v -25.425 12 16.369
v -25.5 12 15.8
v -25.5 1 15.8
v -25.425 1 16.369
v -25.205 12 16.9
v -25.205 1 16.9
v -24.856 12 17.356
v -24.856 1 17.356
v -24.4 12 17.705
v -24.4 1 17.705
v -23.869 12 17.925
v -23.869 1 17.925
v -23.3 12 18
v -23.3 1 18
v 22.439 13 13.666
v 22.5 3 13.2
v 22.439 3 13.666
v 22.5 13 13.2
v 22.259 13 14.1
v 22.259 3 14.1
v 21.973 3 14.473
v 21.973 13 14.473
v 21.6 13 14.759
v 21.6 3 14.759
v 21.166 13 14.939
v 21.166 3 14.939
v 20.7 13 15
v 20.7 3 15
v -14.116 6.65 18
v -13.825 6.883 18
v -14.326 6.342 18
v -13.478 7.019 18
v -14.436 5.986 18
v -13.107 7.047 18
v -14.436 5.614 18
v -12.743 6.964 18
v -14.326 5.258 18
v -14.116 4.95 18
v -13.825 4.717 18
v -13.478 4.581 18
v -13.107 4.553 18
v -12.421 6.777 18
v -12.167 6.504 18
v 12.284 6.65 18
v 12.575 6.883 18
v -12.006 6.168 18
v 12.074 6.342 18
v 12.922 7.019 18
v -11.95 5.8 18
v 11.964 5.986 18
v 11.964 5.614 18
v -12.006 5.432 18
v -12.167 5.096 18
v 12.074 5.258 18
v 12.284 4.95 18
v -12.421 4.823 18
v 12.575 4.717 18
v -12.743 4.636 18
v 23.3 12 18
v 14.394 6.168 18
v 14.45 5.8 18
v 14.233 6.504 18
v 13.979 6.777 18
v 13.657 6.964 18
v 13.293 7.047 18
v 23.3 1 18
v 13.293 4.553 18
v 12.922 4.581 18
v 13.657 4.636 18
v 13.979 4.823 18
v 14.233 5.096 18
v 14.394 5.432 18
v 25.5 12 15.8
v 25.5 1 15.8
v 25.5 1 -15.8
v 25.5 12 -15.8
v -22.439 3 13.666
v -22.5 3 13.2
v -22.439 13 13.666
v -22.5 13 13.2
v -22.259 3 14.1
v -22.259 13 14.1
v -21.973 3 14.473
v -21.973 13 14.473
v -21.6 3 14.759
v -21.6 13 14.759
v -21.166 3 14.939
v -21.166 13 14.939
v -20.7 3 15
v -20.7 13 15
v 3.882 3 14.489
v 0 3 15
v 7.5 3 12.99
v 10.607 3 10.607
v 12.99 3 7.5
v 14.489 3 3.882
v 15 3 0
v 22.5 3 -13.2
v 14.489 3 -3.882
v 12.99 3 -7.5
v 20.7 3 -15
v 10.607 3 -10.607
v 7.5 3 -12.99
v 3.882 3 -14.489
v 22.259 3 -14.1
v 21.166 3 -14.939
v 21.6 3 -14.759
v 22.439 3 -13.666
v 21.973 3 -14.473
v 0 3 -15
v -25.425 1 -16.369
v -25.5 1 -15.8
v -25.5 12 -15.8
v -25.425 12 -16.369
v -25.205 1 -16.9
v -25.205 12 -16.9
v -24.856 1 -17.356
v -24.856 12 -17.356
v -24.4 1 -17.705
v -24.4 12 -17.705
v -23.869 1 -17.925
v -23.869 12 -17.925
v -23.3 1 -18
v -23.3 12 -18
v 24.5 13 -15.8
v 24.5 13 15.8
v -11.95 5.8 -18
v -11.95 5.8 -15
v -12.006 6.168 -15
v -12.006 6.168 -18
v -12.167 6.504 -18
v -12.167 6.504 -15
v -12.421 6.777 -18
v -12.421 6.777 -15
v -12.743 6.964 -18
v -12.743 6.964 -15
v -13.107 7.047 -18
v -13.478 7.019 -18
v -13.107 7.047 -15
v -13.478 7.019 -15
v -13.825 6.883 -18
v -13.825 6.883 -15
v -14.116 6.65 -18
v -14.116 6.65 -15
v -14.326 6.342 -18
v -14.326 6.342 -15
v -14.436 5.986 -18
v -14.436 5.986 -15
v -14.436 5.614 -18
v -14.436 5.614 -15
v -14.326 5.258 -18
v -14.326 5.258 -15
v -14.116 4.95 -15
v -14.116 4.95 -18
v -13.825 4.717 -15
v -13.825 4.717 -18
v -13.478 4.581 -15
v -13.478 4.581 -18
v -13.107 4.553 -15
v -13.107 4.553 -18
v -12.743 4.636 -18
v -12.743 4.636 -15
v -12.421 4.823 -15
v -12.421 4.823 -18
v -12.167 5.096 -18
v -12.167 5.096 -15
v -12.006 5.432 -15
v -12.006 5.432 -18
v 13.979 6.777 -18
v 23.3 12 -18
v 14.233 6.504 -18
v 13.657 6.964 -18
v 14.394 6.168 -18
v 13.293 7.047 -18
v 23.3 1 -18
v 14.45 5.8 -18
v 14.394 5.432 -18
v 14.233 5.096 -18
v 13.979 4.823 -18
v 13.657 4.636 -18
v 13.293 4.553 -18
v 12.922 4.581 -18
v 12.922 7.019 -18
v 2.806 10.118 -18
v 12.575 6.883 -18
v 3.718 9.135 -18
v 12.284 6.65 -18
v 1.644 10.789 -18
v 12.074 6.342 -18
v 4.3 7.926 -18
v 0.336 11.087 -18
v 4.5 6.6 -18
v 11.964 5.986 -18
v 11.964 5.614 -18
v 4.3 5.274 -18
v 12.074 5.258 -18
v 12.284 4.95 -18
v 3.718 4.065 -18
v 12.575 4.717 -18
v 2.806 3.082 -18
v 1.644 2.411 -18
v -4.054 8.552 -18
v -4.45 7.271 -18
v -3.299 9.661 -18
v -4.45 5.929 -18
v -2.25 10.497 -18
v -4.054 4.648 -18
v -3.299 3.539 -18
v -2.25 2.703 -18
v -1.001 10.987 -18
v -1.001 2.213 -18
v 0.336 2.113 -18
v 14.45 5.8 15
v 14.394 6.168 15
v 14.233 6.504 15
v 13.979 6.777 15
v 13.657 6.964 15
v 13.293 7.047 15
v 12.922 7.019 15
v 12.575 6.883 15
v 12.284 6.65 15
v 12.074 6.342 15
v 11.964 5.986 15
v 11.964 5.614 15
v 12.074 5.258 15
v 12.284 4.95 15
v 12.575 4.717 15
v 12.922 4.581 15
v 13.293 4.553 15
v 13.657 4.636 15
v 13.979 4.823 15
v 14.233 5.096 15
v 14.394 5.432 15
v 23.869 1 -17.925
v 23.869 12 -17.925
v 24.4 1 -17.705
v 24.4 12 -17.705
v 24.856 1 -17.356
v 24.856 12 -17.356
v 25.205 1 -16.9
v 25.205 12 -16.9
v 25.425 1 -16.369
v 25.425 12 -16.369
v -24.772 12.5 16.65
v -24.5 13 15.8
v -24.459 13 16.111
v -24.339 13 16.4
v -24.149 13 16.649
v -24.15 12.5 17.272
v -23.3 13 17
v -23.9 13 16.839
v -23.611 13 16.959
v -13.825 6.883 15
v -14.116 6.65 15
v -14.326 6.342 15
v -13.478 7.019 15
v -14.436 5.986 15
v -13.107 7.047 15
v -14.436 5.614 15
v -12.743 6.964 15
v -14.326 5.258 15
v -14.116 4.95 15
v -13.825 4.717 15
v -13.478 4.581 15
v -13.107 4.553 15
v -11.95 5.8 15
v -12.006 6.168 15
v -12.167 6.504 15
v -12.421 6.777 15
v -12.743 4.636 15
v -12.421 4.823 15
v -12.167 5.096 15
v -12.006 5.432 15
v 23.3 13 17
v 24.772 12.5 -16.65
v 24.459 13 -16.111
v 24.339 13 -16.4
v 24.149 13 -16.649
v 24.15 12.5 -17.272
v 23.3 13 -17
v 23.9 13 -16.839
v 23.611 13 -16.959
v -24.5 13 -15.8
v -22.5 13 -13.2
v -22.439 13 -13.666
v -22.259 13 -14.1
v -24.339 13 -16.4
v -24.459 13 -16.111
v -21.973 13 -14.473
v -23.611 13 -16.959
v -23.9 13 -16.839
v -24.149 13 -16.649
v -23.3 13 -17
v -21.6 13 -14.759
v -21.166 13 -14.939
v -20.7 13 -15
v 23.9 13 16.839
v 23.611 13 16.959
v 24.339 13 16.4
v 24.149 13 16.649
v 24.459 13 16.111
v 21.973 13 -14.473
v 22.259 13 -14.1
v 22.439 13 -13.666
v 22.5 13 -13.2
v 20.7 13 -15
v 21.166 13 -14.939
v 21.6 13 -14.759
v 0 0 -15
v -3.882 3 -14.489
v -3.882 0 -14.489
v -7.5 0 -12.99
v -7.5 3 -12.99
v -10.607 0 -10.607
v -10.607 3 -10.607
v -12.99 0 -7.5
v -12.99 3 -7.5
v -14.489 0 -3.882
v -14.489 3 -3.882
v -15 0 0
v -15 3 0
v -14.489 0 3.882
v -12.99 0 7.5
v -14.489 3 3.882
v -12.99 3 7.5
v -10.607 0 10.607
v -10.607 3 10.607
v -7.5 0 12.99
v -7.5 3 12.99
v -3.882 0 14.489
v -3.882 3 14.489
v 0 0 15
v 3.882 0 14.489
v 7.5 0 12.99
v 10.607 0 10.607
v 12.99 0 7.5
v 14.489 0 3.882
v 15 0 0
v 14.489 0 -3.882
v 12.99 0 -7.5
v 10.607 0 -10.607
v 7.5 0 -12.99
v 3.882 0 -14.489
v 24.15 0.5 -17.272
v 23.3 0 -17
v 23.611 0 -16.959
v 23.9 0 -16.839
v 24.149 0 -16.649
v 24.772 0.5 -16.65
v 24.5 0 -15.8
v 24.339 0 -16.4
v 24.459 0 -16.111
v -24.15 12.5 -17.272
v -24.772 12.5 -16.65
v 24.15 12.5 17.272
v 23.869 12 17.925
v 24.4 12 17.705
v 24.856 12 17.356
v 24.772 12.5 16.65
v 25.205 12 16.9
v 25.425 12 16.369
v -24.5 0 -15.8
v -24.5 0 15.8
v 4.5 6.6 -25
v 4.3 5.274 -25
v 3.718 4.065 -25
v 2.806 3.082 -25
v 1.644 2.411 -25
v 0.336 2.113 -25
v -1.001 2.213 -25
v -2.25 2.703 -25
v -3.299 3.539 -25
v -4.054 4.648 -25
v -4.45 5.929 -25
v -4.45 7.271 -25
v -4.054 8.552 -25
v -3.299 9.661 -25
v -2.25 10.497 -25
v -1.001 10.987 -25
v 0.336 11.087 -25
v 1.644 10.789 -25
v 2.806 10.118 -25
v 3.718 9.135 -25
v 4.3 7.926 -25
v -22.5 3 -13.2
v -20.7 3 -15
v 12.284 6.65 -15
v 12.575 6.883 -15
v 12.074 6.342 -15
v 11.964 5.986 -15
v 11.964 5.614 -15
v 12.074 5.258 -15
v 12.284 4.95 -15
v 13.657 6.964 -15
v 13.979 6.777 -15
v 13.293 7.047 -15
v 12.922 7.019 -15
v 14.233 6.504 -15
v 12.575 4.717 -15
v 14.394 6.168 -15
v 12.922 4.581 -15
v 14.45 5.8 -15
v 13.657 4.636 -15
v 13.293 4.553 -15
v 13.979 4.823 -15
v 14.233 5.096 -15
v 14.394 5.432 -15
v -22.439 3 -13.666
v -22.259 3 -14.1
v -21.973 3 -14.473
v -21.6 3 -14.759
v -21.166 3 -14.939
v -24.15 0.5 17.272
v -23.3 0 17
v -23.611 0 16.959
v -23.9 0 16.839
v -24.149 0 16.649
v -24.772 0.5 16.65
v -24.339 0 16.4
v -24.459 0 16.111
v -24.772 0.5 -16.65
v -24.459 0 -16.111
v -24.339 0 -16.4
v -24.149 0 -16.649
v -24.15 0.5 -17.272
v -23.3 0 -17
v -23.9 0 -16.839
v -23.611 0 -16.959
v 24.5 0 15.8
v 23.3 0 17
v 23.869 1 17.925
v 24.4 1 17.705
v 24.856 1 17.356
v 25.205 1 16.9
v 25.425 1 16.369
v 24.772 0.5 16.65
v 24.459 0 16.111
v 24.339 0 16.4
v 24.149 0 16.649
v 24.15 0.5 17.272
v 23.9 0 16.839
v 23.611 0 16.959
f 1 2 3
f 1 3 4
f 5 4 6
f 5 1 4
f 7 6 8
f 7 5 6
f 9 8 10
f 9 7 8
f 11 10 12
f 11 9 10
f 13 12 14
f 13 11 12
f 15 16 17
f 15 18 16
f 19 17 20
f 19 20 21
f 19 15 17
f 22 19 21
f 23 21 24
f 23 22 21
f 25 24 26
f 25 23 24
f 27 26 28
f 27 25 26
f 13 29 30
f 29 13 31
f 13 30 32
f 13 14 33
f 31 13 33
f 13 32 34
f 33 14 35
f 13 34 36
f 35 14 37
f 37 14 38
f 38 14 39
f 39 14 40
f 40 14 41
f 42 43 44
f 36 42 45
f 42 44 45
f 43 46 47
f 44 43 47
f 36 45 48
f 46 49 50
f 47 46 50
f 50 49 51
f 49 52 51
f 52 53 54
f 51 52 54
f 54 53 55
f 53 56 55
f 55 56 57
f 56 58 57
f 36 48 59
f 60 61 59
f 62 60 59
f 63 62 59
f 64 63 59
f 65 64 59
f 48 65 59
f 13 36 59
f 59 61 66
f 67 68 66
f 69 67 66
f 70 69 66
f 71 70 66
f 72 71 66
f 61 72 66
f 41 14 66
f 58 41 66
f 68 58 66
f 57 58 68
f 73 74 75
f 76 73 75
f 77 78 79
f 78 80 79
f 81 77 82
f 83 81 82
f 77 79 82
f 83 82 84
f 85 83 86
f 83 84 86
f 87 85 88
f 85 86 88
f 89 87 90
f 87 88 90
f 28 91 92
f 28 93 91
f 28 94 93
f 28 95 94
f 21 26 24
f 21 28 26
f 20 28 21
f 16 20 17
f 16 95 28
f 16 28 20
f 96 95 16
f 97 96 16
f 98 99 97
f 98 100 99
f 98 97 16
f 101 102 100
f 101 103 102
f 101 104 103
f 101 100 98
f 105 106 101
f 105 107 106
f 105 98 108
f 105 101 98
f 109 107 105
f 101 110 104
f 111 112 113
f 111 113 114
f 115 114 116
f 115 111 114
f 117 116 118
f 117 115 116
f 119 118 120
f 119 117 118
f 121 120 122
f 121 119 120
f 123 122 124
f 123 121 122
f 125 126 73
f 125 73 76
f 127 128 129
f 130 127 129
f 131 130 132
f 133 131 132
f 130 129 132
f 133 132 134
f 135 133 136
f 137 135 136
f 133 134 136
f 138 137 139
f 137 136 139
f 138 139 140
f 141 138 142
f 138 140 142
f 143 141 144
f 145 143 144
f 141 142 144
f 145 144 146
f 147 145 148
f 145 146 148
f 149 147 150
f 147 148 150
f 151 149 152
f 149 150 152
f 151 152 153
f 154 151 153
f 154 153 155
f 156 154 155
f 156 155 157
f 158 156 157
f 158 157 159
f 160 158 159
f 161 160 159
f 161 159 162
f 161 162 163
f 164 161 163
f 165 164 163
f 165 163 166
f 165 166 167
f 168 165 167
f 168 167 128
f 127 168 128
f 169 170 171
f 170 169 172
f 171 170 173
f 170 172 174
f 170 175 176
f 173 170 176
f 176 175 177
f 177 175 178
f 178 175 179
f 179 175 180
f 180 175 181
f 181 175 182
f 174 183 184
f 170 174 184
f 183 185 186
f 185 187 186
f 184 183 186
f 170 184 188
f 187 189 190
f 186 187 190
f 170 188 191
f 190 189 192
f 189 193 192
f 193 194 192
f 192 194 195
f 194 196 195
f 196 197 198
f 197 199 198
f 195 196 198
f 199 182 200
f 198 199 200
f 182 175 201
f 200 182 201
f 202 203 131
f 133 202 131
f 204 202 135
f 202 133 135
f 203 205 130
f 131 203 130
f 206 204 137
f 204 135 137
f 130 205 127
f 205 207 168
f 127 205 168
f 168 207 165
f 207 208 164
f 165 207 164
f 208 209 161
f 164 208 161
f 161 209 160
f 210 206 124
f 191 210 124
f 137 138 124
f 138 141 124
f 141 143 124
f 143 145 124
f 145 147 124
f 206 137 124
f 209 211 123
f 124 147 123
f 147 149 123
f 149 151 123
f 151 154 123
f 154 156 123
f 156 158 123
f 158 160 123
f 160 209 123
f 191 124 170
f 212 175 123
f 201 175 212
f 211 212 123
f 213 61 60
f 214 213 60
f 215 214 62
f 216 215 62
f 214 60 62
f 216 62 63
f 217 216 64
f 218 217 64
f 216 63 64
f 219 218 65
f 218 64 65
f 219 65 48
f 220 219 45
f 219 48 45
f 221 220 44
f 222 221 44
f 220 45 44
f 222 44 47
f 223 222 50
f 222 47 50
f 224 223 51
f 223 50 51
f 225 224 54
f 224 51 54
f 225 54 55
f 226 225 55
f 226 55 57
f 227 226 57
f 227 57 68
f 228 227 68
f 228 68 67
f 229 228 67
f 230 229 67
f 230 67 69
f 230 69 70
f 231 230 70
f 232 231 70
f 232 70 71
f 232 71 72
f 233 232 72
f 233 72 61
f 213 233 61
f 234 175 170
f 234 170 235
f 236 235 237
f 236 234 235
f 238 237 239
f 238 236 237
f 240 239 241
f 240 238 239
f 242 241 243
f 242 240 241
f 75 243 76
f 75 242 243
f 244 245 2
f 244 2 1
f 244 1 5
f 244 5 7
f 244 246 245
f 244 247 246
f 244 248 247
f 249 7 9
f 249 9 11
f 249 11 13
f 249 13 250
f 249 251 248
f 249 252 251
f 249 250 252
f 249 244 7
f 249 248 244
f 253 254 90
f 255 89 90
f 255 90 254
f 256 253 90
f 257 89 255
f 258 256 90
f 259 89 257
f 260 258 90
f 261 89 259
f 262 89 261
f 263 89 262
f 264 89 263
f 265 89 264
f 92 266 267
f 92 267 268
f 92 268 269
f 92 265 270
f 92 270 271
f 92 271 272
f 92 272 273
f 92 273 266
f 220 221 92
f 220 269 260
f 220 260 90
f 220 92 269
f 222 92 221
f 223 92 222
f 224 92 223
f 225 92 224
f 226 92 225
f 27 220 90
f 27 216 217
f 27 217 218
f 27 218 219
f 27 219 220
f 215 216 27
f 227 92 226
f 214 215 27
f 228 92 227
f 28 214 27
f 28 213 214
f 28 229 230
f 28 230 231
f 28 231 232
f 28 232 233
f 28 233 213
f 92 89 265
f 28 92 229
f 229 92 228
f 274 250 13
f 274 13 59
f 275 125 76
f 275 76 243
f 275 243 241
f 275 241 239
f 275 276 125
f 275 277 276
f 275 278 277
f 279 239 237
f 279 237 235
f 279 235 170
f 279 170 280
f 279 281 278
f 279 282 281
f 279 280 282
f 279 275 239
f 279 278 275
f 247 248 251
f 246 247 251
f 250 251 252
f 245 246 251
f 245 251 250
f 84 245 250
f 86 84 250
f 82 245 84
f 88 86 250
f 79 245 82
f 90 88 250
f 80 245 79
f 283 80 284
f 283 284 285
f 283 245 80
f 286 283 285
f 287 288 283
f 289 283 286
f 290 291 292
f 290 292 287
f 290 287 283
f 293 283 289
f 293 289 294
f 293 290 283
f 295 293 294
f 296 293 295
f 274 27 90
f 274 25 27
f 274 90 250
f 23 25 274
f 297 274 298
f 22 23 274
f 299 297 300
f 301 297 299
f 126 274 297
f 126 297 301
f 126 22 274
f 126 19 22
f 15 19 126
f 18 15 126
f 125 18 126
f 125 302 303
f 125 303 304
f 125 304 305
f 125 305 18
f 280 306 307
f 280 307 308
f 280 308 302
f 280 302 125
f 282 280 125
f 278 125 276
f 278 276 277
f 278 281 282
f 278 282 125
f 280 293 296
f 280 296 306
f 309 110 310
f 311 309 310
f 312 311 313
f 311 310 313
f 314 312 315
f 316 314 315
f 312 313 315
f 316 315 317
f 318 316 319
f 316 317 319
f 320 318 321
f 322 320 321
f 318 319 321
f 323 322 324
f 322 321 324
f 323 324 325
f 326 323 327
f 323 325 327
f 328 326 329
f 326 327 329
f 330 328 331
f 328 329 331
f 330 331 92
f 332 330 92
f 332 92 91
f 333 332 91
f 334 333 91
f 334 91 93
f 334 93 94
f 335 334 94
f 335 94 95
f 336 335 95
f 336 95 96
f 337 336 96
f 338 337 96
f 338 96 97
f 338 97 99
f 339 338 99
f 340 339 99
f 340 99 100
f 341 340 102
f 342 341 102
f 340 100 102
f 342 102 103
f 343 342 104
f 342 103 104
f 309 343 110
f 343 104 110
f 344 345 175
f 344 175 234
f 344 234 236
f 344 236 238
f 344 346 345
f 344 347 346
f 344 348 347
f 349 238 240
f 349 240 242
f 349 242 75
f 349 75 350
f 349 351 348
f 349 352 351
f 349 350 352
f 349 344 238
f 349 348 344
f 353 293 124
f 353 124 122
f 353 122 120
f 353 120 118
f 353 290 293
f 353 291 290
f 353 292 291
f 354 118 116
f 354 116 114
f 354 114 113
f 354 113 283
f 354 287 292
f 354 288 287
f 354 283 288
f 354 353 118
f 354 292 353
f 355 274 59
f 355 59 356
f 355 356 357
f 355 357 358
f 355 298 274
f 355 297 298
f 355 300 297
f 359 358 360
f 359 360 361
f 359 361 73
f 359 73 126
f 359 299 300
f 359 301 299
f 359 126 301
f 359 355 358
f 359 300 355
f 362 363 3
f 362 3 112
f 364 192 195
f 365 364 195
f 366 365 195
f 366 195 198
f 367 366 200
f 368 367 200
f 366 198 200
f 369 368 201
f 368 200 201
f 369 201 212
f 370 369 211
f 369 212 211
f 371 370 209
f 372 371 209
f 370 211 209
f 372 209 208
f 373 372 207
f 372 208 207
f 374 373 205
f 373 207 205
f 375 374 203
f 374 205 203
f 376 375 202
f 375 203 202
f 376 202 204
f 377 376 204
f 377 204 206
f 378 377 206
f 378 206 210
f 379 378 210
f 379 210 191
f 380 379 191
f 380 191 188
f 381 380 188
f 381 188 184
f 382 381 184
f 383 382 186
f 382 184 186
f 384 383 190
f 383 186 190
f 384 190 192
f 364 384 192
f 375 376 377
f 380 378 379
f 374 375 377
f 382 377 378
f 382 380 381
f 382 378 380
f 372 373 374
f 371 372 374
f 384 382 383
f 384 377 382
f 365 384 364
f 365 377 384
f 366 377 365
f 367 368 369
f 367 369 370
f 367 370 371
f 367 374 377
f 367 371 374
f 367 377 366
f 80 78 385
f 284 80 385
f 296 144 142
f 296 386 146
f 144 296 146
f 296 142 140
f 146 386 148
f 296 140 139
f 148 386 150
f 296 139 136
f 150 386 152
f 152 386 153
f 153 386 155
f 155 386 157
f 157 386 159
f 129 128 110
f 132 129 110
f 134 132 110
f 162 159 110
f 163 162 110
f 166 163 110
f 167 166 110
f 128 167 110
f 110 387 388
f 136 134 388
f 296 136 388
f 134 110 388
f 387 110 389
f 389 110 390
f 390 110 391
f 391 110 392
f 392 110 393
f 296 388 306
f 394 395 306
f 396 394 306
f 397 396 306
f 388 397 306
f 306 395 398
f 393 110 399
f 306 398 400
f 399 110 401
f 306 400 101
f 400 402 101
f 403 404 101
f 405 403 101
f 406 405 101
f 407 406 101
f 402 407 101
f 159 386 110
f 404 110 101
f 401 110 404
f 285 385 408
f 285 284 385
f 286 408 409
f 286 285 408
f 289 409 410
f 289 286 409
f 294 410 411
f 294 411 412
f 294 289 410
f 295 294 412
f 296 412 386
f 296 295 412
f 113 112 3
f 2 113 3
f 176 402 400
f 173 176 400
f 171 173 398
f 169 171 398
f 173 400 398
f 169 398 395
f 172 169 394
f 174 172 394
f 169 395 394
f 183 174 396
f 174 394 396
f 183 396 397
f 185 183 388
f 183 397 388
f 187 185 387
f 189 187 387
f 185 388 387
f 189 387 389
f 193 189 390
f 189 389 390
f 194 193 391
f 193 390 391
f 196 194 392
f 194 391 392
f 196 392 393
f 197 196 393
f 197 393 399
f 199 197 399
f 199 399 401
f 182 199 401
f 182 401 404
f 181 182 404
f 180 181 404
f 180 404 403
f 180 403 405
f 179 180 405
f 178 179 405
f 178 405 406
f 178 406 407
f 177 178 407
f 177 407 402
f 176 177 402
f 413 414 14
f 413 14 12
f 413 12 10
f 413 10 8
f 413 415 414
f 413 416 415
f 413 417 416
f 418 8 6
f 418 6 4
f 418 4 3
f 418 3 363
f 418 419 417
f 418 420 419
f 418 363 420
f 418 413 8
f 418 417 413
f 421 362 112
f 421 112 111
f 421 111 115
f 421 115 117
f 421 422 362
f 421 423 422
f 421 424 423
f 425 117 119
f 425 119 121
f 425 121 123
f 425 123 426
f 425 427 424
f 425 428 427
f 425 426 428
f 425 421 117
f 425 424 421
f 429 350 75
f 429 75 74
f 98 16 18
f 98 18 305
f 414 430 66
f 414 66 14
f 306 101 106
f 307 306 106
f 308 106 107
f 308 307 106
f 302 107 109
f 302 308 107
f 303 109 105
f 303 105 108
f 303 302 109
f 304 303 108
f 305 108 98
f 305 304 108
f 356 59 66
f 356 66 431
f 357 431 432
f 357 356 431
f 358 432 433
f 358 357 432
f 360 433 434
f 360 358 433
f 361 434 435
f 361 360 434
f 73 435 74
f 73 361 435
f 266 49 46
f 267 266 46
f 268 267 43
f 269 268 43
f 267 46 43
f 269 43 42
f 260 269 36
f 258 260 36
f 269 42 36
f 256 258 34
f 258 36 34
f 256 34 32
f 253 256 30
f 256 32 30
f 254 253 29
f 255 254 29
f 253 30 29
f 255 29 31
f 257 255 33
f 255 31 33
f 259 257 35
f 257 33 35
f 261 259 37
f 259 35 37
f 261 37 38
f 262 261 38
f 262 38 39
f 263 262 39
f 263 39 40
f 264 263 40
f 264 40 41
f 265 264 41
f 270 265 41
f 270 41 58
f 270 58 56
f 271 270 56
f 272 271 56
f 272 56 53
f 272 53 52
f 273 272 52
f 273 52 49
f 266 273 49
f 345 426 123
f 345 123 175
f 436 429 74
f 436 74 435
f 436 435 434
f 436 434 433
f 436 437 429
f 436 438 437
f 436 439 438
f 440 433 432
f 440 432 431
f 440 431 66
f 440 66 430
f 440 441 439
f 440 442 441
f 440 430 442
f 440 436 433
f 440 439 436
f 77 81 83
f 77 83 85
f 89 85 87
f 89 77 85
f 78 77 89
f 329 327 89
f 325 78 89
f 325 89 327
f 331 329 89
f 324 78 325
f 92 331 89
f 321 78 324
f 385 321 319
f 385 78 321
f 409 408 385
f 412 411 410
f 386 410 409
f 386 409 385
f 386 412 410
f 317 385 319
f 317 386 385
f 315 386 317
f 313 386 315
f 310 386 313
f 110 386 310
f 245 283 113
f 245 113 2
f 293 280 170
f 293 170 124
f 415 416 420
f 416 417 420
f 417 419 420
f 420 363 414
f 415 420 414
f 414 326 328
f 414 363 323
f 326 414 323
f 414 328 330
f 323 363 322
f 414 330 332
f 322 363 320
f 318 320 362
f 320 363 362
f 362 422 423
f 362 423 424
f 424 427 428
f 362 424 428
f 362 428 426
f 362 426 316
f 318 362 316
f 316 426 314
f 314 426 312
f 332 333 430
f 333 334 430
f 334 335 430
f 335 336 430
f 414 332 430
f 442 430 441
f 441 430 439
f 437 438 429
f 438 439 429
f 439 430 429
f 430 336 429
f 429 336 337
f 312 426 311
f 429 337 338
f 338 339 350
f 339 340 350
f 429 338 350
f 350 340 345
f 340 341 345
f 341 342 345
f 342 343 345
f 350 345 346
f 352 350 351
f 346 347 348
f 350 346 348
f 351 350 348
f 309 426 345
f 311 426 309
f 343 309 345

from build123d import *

# Parameters (mm, degrees)
SKETCH1_W           = 51
SKETCH1_H           = 36
BOSS_EXTRUDE1_DEPTH = 3
SKETCH2_W           = 45
SKETCH2_H           = 30
BOSS_EXTRUDE2_DEPTH = 10
FILLET1_R           = 1.8
FILLET2_R           = 2.2
CHAMFER1_SIZE       = 1
SKETCH3_R           = 15
CUT_EXTRUDE1_DEPTH  = 10
SKETCH4_R           = 1.25
CUT_EXTRUDE2_DEPTH  = 50
CHAMFER2_SIZE       = 1
SKETCH5_R           = 4.5
BOSS_EXTRUDE3_DEPTH = 7


with BuildPart() as part:
    # Sketch1 → Boss-Extrude1 (new body)
    with BuildSketch(Plane(origin=(0, 0, 0), x_dir=(1, 0, 0), z_dir=(0, 1, 0))):
        Rectangle(SKETCH1_W, SKETCH1_H)
    extrude(amount=BOSS_EXTRUDE1_DEPTH)

    # Sketch2 → Boss-Extrude2 (add)
    with BuildSketch(Plane(origin=(0, 3, 0), x_dir=(1, 0, 0), z_dir=(0, 1, 0))):
        Polygon((-22.5, 18), (-25.5, 18), (-25.5, 15), (-25.5, -15), (-25.5, -18), (-22.5, -18), (22.5, -18), (25.5, -18), (25.5, -15), (25.5, 15), (25.5, 18), (22.5, 18), align=None)
        Rectangle(SKETCH2_W, SKETCH2_H, mode=Mode.SUBTRACT)
    extrude(amount=BOSS_EXTRUDE2_DEPTH)

    # Fillet1
    fillet1_edges = [part.edges().sort_by_distance(p)[0] for p in [
        (22.5, 8, 15),
        (-22.5, 8, 15),
        (-22.5, 8, -15),
        (22.5, 8, -15),
    ]]
    fillet(fillet1_edges, radius=FILLET1_R)

    # Fillet2
    fillet2_edges = [part.edges().sort_by_distance(p)[0] for p in [
        (25.5, 6.5, 18),
        (-25.5, 6.5, 18),
        (-25.5, 6.5, -18),
        (25.5, 6.5, -18),
    ]]
    fillet(fillet2_edges, radius=FILLET2_R)

    # Chamfer1
    chamfer1_edges = [part.edges().sort_by_distance(p)[0] for p in [
        (-25.5, 0, 0),
        (25.5, 0, 0),
        (0, 0, 18),
        (0, 0, -18),
        (24.855634919, 0, 17.355634919),
        (24.855634919, 0, -17.355634919),
        (-24.855634919, 0, 17.355634919),
        (-24.855634919, 0, -17.355634919),
    ]]
    chamfer(chamfer1_edges, length=CHAMFER1_SIZE)

    # Sketch3 → Cut-Extrude1 (cut)
    with BuildSketch(Plane(origin=(0, 3, 0), x_dir=(1, 0, 0), z_dir=(0, 1, 0))):
        with Locations(Location((0, 0, 0), (0, 0, 90))):
            Circle(SKETCH3_R)
    extrude(amount=-CUT_EXTRUDE1_DEPTH, mode=Mode.SUBTRACT)

    # Sketch4 → Cut-Extrude2 (cut)
    with BuildSketch(Plane.XY.offset(18)):
        with Locations((-13.2, 5.8)):
            Circle(SKETCH4_R)
        with Locations((13.2, 5.8)):
            Circle(SKETCH4_R)
    extrude(amount=-CUT_EXTRUDE2_DEPTH, mode=Mode.SUBTRACT)

    # Chamfer2
    chamfer2_edges = [part.edges().sort_by_distance(p)[0] for p in [
        (-25.5, 13, 0),
        (0, 13, -18),
        (0, 13, 18),
        (25.5, 13, 0),
        (24.855634919, 13, 17.355634919),
        (24.855634919, 13, -17.355634919),
        (-24.855634919, 13, 17.355634919),
        (-24.855634919, 13, -17.355634919),
    ]]
    chamfer(chamfer2_edges, length=CHAMFER2_SIZE)

    # Sketch5 → Boss-Extrude3 (add)
    with BuildSketch(Plane(origin=(0, 0, -18), x_dir=(-1, 0, 0), z_dir=(0, 0, -1))):
        with Locations(Location((0, 6.6, 0), (0, 0, 180))):
            Circle(SKETCH5_R)
    extrude(amount=BOSS_EXTRUDE3_DEPTH)


solid = part.part
